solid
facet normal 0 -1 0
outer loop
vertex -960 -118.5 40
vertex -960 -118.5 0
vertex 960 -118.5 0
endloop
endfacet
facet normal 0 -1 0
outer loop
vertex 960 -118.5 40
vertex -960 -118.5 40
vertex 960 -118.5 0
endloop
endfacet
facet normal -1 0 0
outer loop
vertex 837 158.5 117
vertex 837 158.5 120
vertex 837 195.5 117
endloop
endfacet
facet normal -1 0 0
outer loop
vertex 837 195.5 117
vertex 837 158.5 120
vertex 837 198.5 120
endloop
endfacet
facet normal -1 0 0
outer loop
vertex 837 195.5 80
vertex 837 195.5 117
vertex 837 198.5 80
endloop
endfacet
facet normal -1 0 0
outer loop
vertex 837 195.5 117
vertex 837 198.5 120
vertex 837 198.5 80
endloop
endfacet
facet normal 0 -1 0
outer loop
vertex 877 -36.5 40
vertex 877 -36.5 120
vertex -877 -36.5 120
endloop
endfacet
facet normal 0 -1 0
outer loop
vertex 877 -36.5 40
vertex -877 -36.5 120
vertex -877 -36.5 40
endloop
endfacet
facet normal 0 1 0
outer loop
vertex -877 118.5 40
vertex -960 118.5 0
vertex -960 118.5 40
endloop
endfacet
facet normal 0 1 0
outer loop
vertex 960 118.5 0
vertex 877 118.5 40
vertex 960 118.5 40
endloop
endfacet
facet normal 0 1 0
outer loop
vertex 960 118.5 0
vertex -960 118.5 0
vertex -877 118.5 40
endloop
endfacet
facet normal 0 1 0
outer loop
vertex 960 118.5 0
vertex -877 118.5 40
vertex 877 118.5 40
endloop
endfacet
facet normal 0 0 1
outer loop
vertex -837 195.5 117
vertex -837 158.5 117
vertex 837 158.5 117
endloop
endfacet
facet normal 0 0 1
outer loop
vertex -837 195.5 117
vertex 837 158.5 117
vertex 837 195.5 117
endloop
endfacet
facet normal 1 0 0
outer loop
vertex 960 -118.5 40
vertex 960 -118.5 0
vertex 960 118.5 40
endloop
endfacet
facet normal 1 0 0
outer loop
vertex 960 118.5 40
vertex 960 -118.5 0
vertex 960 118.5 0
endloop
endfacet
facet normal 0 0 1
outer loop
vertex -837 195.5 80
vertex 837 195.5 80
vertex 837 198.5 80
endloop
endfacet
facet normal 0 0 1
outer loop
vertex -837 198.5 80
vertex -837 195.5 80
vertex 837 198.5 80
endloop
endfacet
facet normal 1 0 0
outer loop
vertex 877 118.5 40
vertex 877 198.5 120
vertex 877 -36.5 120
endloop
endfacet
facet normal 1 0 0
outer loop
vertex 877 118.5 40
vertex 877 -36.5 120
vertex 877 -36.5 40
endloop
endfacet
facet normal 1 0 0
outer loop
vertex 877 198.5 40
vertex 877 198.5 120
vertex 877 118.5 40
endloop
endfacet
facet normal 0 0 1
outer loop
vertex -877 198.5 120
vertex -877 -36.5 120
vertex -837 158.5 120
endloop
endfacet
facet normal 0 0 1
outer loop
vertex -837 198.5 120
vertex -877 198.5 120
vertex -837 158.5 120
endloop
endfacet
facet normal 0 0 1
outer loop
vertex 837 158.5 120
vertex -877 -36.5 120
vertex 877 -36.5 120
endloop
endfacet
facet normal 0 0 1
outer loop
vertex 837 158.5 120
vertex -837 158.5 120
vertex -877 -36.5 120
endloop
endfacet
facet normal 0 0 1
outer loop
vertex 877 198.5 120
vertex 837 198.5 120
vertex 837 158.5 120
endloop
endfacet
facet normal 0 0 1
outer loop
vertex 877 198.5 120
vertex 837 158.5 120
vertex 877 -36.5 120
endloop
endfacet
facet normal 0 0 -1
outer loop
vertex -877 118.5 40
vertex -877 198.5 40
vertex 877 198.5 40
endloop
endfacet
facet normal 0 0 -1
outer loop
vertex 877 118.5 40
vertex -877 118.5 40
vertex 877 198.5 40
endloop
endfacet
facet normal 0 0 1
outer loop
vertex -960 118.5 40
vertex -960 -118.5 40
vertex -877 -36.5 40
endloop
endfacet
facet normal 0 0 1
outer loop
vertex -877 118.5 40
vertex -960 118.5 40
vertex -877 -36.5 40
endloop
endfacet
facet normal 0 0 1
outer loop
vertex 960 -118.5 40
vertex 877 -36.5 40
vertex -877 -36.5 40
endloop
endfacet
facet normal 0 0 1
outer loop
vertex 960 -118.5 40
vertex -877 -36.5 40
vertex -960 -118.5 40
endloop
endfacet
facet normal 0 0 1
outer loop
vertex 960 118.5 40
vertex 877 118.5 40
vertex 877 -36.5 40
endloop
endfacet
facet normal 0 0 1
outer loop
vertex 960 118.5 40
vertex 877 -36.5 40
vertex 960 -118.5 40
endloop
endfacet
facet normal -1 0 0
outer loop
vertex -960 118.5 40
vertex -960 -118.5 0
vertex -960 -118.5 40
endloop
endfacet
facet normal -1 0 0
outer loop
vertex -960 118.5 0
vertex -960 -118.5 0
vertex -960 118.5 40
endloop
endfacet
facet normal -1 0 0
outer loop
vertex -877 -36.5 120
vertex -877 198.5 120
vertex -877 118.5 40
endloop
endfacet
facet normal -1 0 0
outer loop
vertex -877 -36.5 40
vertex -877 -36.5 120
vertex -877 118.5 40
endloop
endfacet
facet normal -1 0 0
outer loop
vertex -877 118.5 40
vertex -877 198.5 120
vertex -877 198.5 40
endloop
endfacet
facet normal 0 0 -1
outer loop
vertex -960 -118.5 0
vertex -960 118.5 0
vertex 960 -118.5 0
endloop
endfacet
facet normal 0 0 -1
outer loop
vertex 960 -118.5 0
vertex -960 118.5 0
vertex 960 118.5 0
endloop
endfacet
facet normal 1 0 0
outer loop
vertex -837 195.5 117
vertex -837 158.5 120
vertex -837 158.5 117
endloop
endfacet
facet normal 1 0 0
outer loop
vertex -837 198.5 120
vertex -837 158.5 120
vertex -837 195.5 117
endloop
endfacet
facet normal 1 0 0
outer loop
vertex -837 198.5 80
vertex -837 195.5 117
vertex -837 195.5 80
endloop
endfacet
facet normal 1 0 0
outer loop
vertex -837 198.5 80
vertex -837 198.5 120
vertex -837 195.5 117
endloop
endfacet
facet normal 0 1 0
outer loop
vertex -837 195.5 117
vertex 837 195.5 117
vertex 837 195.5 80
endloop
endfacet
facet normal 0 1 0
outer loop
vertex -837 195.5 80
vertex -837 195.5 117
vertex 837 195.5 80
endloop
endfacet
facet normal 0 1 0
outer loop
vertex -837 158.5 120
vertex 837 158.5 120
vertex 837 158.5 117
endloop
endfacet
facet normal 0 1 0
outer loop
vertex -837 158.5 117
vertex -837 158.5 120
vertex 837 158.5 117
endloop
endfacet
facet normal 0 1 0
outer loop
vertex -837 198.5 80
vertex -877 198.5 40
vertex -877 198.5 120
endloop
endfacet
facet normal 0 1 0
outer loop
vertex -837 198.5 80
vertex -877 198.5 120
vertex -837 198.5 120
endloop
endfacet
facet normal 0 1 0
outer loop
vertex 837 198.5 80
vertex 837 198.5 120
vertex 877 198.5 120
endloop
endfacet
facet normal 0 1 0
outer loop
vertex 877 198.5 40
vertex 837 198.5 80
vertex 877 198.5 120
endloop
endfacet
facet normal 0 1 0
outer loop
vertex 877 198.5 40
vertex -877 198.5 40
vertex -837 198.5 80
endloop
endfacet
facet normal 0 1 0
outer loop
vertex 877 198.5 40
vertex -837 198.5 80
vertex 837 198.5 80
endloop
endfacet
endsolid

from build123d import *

# Parameters (mm, degrees)
SKETCH1_W           = 1920
SKETCH1_H           = 237
BOSS_EXTRUDE1_DEPTH = 40
SKETCH2_W           = 1920
SKETCH2_H           = 317
BOSS_EXTRUDE2_DEPTH = 80
SKETCH3_W           = 23
SKETCH3_H           = 80
CUT_EXTRUDE2_DEPTH  = 1019.081038032
SKETCH6_W           = 80
SKETCH6_H           = 82
CUT_EXTRUDE3_DEPTH  = 1912.128266234
SKETCH7_W           = 60
SKETCH7_H           = 80
CUT_EXTRUDE4_DEPTH  = 1019.081038032
CUT_EXTRUDE5_DEPTH  = 1674


with BuildPart() as part:
    # Sketch1 → Boss-Extrude1 (new body)
    with BuildSketch(Plane.XY):
        Rectangle(SKETCH1_W, SKETCH1_H)
    extrude(amount=BOSS_EXTRUDE1_DEPTH)

    # Sketch2 → Boss-Extrude2 (add)
    with BuildSketch(Plane.XY.offset(40)):
        with Locations((0, 40)):
            Rectangle(SKETCH2_W, SKETCH2_H)
    extrude(amount=BOSS_EXTRUDE2_DEPTH)

    # Sketch3 → Cut-Extrude2 (cut, through all)
    with BuildSketch(Plane(origin=(0, 198.5, 0), x_dir=(1, 0, 0), z_dir=(0, 1, 0))):
        with Locations((-948.5, -80)):
            Rectangle(SKETCH3_W, SKETCH3_H)
        with Locations((948.5, -80)):
            Rectangle(SKETCH3_W, SKETCH3_H)
    extrude(amount=-CUT_EXTRUDE2_DEPTH, mode=Mode.SUBTRACT)

    # Sketch6 → Cut-Extrude3 (cut, through all)
    with BuildSketch(Plane(origin=(937, 0, 0), x_dir=(0, 0, -1), z_dir=(1, 0, 0))):
        with Locations((-80, -77.5)):
            Rectangle(SKETCH6_W, SKETCH6_H)
    extrude(amount=-CUT_EXTRUDE3_DEPTH, mode=Mode.SUBTRACT)

    # Sketch7 → Cut-Extrude4 (cut, through all)
    with BuildSketch(Plane(origin=(0, 198.5, 0), x_dir=(1, 0, 0), z_dir=(0, 1, 0))):
        with Locations((-907, -80)):
            Rectangle(SKETCH7_W, SKETCH7_H)
        with Locations((907, -80)):
            Rectangle(SKETCH7_W, SKETCH7_H)
    extrude(amount=-CUT_EXTRUDE4_DEPTH, mode=Mode.SUBTRACT)

    # Sketch8 → Cut-Extrude5 (cut)
    with BuildSketch(Plane(origin=(837, 0, 0), x_dir=(0, 0, -1), z_dir=(1, 0, 0))):
        Polygon((-117, 158.5), (-117, 195.5), (-80, 195.5), (-80, 198.5), (-120, 198.5), (-120, 158.5), align=None)
    extrude(amount=-CUT_EXTRUDE5_DEPTH, mode=Mode.SUBTRACT)


solid = part.part
